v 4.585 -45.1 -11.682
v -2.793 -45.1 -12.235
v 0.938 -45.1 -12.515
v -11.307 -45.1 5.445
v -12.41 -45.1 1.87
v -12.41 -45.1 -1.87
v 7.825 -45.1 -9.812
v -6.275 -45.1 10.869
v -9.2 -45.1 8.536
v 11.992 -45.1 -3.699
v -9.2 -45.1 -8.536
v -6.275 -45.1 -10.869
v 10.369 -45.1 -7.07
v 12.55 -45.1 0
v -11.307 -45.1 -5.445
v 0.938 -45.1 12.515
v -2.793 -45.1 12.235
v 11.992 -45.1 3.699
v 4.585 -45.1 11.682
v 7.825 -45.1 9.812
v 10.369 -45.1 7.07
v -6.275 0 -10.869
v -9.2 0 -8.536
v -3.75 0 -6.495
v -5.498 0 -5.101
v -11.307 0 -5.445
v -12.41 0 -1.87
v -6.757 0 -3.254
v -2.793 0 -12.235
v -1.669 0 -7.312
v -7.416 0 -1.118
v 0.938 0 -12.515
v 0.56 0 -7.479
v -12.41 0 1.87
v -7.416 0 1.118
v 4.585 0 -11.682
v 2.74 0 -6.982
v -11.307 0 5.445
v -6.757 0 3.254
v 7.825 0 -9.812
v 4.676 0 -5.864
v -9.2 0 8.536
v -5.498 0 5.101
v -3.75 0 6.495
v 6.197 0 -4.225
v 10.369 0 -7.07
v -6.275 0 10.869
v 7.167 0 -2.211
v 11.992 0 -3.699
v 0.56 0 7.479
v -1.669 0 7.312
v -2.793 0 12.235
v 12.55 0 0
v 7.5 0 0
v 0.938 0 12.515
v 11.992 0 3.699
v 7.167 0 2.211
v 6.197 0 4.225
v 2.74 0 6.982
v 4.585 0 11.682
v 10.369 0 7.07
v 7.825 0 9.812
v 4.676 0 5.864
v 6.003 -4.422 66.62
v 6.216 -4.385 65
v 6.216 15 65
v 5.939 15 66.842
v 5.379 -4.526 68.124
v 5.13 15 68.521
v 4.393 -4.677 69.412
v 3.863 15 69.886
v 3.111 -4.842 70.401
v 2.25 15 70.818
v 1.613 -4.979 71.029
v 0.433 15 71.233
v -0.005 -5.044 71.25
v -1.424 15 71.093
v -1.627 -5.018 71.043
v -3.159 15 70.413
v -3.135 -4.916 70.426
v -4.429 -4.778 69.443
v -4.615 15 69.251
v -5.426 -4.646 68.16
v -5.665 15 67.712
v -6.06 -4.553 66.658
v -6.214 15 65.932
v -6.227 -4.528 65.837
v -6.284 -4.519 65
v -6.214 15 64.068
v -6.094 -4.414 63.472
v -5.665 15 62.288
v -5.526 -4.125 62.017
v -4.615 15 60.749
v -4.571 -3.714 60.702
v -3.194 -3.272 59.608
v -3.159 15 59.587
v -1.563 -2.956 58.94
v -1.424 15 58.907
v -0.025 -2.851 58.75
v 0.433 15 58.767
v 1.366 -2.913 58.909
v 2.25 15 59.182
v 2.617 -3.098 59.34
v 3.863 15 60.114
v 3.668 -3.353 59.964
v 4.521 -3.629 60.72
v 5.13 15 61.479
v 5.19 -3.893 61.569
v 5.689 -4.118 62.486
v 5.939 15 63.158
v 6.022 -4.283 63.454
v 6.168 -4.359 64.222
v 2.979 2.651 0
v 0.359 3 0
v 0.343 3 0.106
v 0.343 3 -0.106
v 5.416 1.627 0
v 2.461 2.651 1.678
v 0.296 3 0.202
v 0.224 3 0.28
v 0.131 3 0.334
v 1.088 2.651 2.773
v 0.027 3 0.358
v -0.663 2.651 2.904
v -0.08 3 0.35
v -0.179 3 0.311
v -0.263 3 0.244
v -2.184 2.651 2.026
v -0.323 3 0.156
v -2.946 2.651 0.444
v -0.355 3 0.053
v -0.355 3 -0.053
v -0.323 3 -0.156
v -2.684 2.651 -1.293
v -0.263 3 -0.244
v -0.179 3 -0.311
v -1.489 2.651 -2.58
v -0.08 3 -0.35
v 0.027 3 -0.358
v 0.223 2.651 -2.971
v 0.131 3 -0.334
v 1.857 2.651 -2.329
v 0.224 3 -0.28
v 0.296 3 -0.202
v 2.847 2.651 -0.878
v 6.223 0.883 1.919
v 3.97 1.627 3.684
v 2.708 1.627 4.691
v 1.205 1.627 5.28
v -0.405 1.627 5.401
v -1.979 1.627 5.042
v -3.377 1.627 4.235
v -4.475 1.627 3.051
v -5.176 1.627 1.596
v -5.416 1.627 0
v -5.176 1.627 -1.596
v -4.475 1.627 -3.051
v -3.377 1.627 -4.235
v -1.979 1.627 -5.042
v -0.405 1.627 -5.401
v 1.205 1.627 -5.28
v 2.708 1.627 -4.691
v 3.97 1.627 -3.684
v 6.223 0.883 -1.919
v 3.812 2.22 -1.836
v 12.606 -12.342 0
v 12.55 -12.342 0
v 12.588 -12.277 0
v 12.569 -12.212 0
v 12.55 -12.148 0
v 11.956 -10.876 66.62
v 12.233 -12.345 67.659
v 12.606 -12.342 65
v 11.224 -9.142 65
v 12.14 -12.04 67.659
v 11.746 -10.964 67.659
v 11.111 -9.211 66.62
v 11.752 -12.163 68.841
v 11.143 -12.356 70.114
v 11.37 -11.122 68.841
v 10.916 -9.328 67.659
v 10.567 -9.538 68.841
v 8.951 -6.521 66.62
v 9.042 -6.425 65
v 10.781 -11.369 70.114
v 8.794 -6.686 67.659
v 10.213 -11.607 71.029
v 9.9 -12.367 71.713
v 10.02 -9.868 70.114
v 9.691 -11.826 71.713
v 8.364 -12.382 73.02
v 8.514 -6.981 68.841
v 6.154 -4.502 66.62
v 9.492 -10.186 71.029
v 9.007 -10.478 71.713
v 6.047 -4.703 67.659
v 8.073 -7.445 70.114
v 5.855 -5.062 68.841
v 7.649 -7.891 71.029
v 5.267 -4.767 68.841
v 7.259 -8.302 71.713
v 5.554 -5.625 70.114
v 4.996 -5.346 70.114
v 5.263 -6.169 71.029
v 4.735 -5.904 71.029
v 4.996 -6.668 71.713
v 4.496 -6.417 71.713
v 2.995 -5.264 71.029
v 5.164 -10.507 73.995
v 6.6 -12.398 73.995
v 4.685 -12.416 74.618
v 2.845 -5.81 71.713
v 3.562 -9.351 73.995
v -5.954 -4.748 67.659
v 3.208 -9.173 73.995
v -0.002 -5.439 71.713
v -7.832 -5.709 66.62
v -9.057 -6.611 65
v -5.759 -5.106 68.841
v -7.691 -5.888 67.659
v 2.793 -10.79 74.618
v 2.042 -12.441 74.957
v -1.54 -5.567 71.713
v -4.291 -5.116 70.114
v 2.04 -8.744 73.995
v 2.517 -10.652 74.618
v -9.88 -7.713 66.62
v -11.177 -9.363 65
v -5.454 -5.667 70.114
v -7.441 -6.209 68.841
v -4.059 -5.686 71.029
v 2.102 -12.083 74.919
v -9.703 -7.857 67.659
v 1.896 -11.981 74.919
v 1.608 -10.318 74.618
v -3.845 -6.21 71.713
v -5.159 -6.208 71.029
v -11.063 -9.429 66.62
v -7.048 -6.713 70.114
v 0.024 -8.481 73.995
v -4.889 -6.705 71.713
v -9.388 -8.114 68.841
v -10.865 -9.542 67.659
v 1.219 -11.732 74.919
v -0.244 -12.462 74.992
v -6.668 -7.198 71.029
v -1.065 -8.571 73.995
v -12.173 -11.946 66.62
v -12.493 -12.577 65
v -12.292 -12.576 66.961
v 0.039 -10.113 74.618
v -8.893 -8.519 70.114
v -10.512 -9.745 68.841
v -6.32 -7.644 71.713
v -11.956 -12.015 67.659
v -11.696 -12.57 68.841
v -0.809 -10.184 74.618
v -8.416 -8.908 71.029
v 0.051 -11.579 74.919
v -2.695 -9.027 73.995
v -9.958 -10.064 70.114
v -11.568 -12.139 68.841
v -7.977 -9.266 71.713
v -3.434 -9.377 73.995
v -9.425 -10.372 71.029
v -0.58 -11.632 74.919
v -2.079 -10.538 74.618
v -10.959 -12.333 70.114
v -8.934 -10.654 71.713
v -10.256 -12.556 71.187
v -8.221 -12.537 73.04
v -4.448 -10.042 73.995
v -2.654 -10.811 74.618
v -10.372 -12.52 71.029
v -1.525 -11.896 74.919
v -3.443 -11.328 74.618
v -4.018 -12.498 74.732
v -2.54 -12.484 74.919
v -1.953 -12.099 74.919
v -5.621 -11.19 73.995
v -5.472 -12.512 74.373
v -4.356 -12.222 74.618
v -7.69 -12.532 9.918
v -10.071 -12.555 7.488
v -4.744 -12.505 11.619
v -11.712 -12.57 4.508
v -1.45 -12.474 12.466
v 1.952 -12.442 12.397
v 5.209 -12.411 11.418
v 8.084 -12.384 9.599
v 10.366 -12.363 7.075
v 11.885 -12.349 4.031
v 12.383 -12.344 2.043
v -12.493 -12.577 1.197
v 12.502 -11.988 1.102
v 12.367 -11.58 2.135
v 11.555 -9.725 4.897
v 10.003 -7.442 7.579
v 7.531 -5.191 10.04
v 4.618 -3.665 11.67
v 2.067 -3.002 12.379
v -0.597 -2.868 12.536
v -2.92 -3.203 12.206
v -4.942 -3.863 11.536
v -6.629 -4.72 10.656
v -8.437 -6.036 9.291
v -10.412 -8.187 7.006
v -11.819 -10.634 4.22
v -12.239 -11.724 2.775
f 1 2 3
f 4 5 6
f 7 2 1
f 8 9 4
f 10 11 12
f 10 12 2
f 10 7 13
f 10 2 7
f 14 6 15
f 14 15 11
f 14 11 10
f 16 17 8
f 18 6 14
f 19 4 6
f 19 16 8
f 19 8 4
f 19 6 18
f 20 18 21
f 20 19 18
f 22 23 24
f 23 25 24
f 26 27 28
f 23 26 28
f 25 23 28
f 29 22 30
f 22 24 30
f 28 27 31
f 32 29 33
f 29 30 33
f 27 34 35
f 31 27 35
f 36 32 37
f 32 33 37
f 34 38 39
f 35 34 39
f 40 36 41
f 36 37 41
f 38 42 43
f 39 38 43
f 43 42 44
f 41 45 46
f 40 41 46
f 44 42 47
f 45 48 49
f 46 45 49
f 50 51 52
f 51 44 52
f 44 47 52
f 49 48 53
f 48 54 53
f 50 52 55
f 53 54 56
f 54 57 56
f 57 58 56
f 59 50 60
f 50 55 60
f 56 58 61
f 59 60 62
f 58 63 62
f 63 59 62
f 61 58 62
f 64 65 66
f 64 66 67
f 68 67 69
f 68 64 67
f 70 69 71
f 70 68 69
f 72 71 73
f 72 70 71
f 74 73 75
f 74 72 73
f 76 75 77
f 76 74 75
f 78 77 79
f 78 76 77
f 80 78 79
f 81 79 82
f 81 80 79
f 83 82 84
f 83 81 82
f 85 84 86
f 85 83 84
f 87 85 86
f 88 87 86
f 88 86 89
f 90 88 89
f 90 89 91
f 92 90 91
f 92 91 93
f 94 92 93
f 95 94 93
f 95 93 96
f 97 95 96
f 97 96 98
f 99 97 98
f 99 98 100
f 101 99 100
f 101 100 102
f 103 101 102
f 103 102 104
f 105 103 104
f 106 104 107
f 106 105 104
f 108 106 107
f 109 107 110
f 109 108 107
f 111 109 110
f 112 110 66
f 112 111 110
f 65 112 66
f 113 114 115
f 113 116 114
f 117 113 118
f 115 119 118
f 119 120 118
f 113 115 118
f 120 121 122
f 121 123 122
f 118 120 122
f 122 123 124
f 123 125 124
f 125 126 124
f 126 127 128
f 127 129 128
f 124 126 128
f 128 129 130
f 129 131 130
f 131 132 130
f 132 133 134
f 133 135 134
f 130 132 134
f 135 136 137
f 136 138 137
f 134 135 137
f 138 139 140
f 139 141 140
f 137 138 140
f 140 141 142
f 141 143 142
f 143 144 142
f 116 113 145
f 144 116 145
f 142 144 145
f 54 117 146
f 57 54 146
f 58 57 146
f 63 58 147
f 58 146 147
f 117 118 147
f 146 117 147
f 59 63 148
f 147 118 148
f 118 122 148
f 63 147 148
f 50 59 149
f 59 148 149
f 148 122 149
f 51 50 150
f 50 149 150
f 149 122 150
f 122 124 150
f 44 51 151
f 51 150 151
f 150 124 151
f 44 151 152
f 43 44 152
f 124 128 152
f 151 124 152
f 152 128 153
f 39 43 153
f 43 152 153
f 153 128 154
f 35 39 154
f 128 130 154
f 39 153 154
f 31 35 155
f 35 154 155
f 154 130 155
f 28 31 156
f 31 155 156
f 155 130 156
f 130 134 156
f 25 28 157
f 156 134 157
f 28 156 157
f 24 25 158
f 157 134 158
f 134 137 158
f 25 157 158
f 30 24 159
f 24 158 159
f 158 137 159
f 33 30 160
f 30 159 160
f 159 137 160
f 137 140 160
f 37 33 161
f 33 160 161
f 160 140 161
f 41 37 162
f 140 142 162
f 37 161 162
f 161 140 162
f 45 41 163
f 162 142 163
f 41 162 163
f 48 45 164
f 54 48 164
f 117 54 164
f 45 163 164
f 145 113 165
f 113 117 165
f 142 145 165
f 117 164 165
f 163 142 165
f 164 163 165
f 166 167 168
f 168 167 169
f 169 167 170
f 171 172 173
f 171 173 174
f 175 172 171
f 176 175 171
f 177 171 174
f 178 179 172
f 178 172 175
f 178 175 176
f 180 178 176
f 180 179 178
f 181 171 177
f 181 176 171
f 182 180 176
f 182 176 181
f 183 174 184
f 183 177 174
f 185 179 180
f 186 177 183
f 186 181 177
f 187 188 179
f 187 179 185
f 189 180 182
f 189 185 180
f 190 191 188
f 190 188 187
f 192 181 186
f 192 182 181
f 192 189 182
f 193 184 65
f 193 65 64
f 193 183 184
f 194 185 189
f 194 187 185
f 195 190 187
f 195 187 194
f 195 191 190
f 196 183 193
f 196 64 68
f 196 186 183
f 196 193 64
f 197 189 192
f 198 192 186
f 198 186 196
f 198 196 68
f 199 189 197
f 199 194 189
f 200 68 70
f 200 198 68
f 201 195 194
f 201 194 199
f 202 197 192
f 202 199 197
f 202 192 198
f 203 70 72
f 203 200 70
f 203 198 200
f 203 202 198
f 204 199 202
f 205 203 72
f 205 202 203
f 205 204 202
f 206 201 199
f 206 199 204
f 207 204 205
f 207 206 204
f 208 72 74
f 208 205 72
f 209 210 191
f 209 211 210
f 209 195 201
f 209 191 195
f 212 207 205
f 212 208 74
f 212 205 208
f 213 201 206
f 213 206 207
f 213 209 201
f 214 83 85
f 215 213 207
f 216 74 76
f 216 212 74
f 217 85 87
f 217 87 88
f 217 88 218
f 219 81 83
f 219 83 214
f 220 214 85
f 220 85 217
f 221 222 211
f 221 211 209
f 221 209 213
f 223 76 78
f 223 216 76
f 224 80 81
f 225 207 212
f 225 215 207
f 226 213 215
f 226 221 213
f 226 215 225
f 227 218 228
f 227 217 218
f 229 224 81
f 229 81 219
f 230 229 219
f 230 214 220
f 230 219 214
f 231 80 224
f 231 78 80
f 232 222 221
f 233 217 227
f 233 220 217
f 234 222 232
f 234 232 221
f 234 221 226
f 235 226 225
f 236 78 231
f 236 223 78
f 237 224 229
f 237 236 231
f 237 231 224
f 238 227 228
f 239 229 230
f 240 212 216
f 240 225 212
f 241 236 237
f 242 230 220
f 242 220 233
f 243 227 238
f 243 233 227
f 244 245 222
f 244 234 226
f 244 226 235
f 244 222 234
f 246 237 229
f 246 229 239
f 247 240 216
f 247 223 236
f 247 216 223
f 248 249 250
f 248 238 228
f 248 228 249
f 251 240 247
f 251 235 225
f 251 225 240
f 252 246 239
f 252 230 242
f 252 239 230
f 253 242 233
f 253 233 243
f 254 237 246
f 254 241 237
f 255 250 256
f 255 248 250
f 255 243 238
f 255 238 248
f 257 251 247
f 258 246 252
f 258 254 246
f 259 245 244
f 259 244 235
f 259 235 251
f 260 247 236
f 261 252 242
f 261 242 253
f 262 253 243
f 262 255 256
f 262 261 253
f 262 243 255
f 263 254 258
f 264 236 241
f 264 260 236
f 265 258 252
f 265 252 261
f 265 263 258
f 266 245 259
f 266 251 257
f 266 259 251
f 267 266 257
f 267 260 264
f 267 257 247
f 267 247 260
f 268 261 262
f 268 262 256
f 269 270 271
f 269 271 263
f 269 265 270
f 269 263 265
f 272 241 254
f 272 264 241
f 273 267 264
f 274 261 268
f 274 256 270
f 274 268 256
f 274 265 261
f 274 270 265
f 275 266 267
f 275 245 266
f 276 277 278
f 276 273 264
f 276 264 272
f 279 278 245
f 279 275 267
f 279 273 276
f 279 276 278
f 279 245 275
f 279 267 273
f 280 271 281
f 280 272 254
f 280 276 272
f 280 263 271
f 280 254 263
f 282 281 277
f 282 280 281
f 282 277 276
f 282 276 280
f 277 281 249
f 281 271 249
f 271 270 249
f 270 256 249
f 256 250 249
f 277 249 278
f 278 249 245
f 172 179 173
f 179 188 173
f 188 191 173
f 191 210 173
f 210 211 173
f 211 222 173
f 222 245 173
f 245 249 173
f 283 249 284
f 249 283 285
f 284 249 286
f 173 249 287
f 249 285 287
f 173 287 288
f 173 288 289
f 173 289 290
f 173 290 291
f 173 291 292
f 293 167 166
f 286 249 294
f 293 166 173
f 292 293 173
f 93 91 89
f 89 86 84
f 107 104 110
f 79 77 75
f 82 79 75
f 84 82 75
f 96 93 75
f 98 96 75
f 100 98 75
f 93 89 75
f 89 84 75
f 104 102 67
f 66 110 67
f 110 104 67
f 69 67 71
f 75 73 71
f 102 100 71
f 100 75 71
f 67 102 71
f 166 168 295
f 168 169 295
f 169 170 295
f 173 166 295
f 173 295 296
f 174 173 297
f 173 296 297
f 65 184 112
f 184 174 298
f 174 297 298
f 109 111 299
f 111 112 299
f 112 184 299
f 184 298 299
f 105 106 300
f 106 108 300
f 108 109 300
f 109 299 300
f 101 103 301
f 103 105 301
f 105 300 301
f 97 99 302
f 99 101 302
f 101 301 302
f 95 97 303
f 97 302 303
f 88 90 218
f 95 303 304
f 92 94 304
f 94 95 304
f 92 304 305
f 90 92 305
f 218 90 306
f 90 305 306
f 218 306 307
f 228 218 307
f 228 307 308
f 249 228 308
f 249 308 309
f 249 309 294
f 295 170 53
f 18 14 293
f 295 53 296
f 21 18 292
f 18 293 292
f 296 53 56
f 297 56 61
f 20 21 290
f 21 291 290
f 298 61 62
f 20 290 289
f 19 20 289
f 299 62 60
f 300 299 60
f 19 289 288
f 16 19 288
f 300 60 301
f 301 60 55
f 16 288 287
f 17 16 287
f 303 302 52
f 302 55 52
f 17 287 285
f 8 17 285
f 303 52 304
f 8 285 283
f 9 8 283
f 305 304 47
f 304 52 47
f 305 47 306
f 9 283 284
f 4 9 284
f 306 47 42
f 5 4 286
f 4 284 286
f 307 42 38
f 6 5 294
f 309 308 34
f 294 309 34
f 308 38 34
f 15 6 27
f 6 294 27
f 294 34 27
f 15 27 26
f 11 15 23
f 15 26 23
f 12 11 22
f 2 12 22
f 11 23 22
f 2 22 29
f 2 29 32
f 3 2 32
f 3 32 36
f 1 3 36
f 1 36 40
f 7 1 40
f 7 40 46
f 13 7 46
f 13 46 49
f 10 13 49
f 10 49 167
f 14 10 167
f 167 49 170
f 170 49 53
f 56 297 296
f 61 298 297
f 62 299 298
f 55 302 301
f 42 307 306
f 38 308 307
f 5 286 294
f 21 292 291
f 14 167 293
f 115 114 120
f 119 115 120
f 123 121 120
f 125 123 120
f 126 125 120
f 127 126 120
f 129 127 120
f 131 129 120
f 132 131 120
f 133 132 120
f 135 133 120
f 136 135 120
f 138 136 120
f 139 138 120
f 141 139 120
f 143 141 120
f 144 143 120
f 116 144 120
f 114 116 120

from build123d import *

# Parameters (mm, degrees)
F0_R        = 12.55
F1_DEPTH    = 45.1
F2_R        = 7.5
F3_DEPTH    = 3
F6_DEPTH    = 75
F7_T2_ANGLE = 359.64
F9_R        = 6.25
F10_DEPTH   = 25


# Not quite as in the source:
# - a fillet or chamfer that OpenCascade refuses, or shapes differently, is made with other operations: its cross-section is extruded or revolved along the edge and cut away or added


with BuildPart() as f1:
    # F0 (on Front) → F1 (new body)
    with BuildSketch(Plane.XZ):
        Circle(F0_R)
    extrude(amount=F1_DEPTH)

    # F2 (on Front) → F3 (join)
    with BuildSketch(Plane.XZ):
        Circle(F2_R)
    extrude(amount=-F3_DEPTH)

    # F4: fillet of radius 10 on 1 edges, made by hand

    # F4_s1 → F4_t2 (revolve, cut)
    with BuildSketch(Plane.XY):
        with BuildLine():
            ThreePointArc((7.5, 0), (4.2315549177, 2.2195444573), (0.3585715715, 3))
            Line((0.3585715715, 3), (7.5, 3))
            Line((7.5, 3), (7.5, 0))
        make_face()
    revolve(axis=Axis((0, 3, 0), (0, -1, 0)), mode=Mode.SUBTRACT)

    # F5 (on Top) → F6 (join)
    with BuildSketch(Plane.XY):
        with BuildLine():
            Line((-12.4928209826, -12.5774559094), (12.6060726016, -12.3417848491))
            ThreePointArc((12.6060726016, -12.3417848491), (-0.0335977446, -2.8508403226), (-12.4928209826, -12.5774559094))
        make_face()
    extrude(amount=F6_DEPTH)

    # F7: fillet of radius 10 on 1 edges, made by hand

    # F7_s1 → F7_t2 (revolve, cut)
    with BuildSketch(Plane(origin=(-0.1101500857, -0.0013803647, 0), x_dir=(0, 0, 1), z_dir=(-0.9999214878, -0.0125306879, 0))):
        with BuildLine():
            ThreePointArc((65, -28.8501313418), (72.0710678119, -25.9211991536), (75, -18.8501313418))
            Line((75, -18.8501313418), (75, -28.8501313418))
            Line((75, -28.8501313418), (65, -28.8501313418))
        make_face()
    revolve(axis=Axis((0.0884629639, -15.8502672786, 75), (0, 0, 1)), revolution_arc=F7_T2_ANGLE, mode=Mode.SUBTRACT)

    # F9 (on offset) → F10 (join)
    with BuildSketch(Plane.XZ.offset(10)):
        with Locations((-0.0335977446, 65)):
            Circle(F9_R)
    extrude(amount=-F10_DEPTH)


solid = f1.part
